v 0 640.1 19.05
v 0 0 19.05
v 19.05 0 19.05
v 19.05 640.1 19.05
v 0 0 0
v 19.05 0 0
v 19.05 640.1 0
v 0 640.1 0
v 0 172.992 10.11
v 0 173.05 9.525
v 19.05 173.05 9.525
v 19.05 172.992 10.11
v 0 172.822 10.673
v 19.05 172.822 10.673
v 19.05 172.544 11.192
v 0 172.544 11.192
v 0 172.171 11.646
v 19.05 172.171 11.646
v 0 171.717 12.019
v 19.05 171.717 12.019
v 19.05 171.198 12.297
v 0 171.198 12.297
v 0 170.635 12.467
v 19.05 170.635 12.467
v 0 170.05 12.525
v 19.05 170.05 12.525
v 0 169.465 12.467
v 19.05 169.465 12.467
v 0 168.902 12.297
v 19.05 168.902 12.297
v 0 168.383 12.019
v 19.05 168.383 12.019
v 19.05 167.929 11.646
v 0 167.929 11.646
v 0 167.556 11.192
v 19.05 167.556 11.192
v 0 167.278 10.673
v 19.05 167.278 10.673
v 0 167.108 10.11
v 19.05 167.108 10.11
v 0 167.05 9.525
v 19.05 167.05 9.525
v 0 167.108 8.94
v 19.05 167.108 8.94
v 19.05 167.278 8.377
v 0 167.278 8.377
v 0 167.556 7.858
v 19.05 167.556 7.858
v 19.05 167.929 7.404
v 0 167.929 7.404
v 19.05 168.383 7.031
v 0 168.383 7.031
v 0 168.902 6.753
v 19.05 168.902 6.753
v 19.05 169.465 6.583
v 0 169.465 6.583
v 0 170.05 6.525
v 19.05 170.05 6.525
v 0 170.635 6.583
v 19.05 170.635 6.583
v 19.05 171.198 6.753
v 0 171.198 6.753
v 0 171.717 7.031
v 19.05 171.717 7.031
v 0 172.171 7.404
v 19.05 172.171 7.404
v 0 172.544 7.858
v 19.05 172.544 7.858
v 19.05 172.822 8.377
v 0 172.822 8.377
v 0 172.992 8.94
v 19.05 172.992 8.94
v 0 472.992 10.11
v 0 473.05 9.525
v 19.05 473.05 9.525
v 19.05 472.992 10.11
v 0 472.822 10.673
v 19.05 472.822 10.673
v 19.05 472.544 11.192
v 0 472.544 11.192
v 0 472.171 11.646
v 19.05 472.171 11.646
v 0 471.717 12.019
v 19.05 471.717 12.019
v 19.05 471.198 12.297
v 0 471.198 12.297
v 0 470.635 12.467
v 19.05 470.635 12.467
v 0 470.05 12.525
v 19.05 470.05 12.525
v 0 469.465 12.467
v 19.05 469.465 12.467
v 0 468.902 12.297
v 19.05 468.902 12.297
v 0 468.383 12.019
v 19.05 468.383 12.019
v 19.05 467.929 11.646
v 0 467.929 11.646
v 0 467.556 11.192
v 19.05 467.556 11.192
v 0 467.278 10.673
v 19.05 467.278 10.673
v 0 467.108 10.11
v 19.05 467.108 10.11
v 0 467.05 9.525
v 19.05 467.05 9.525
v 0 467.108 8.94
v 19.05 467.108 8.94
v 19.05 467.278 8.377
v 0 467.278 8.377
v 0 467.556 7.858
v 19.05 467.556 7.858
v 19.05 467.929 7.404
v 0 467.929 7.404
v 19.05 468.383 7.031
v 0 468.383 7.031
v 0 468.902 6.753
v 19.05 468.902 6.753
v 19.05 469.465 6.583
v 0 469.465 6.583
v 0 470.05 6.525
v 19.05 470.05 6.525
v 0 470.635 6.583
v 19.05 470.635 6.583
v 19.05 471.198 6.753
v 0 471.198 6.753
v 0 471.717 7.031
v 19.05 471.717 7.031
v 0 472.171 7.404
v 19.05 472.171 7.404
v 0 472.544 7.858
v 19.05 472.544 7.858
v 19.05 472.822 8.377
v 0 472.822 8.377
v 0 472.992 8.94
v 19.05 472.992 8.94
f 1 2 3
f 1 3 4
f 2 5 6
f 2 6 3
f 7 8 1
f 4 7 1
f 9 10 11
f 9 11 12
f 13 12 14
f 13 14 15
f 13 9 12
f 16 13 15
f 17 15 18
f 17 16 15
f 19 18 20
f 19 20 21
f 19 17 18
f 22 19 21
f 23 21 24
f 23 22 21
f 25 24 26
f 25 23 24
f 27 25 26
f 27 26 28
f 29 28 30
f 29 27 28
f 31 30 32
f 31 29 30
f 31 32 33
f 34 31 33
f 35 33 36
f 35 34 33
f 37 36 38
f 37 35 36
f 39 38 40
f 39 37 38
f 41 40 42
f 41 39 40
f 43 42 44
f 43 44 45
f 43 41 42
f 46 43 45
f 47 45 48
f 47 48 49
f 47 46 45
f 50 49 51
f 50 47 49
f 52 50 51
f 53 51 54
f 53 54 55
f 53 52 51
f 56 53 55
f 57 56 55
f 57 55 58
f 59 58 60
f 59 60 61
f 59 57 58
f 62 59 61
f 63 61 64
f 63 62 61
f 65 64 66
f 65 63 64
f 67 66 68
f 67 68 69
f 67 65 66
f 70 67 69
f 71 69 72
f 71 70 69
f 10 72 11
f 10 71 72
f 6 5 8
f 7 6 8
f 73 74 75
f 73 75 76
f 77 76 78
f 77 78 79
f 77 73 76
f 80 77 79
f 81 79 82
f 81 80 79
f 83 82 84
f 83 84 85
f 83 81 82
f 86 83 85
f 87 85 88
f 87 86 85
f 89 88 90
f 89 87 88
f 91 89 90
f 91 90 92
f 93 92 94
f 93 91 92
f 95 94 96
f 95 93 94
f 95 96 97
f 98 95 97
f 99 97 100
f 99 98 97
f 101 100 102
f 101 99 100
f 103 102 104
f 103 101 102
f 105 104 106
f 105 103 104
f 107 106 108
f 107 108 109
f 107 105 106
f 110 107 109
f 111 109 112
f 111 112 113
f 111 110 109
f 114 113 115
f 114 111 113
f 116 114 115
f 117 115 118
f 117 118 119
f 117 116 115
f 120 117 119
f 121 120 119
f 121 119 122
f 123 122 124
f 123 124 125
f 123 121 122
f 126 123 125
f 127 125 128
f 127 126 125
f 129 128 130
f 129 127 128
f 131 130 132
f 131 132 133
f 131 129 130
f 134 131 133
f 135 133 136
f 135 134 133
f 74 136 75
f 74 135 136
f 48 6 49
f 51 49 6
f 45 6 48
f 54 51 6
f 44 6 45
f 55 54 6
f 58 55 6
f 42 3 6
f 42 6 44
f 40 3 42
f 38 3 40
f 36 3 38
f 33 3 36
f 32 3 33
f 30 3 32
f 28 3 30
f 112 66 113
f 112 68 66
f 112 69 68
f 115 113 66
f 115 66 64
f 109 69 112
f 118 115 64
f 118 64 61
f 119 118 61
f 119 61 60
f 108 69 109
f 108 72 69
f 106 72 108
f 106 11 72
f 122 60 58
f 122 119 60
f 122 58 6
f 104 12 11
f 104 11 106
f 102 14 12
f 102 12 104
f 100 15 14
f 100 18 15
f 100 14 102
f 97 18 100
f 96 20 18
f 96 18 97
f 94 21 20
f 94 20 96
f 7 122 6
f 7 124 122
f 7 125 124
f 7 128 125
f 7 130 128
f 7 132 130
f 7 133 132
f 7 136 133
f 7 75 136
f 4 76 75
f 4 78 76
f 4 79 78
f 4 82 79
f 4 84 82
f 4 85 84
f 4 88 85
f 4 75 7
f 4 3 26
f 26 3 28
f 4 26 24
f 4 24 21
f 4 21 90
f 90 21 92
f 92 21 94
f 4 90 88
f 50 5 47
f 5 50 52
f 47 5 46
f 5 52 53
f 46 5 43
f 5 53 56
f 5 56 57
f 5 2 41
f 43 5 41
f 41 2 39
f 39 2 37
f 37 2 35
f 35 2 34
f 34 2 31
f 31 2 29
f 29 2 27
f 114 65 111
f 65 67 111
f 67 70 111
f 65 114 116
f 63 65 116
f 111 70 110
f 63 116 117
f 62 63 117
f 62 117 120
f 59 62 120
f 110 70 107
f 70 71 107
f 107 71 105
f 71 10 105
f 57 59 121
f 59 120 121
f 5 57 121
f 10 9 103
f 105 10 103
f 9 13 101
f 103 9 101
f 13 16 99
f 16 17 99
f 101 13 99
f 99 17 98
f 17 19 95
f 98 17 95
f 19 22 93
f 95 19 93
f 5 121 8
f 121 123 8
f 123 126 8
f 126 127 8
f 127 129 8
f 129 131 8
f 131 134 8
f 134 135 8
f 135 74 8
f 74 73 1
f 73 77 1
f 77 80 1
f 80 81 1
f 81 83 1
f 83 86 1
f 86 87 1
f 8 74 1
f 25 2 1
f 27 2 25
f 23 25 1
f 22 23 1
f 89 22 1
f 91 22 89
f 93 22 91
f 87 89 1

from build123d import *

# Parameters (mm, degrees)
SKETCH_W  = 640.1
SKETCH_H  = 19.05
SKETCH_R  = 3
PAD_DEPTH = 19.05


with BuildPart() as part:
    # Sketch → Pad (new body)
    with BuildSketch(Plane.YZ):
        with Locations((320.05, 9.525)):
            Rectangle(SKETCH_W, SKETCH_H)
        with Locations((170.05, 9.525)):
            Circle(SKETCH_R, mode=Mode.SUBTRACT)
        with Locations((470.05, 9.525)):
            Circle(SKETCH_R, mode=Mode.SUBTRACT)
    extrude(amount=PAD_DEPTH)


solid = part.part
